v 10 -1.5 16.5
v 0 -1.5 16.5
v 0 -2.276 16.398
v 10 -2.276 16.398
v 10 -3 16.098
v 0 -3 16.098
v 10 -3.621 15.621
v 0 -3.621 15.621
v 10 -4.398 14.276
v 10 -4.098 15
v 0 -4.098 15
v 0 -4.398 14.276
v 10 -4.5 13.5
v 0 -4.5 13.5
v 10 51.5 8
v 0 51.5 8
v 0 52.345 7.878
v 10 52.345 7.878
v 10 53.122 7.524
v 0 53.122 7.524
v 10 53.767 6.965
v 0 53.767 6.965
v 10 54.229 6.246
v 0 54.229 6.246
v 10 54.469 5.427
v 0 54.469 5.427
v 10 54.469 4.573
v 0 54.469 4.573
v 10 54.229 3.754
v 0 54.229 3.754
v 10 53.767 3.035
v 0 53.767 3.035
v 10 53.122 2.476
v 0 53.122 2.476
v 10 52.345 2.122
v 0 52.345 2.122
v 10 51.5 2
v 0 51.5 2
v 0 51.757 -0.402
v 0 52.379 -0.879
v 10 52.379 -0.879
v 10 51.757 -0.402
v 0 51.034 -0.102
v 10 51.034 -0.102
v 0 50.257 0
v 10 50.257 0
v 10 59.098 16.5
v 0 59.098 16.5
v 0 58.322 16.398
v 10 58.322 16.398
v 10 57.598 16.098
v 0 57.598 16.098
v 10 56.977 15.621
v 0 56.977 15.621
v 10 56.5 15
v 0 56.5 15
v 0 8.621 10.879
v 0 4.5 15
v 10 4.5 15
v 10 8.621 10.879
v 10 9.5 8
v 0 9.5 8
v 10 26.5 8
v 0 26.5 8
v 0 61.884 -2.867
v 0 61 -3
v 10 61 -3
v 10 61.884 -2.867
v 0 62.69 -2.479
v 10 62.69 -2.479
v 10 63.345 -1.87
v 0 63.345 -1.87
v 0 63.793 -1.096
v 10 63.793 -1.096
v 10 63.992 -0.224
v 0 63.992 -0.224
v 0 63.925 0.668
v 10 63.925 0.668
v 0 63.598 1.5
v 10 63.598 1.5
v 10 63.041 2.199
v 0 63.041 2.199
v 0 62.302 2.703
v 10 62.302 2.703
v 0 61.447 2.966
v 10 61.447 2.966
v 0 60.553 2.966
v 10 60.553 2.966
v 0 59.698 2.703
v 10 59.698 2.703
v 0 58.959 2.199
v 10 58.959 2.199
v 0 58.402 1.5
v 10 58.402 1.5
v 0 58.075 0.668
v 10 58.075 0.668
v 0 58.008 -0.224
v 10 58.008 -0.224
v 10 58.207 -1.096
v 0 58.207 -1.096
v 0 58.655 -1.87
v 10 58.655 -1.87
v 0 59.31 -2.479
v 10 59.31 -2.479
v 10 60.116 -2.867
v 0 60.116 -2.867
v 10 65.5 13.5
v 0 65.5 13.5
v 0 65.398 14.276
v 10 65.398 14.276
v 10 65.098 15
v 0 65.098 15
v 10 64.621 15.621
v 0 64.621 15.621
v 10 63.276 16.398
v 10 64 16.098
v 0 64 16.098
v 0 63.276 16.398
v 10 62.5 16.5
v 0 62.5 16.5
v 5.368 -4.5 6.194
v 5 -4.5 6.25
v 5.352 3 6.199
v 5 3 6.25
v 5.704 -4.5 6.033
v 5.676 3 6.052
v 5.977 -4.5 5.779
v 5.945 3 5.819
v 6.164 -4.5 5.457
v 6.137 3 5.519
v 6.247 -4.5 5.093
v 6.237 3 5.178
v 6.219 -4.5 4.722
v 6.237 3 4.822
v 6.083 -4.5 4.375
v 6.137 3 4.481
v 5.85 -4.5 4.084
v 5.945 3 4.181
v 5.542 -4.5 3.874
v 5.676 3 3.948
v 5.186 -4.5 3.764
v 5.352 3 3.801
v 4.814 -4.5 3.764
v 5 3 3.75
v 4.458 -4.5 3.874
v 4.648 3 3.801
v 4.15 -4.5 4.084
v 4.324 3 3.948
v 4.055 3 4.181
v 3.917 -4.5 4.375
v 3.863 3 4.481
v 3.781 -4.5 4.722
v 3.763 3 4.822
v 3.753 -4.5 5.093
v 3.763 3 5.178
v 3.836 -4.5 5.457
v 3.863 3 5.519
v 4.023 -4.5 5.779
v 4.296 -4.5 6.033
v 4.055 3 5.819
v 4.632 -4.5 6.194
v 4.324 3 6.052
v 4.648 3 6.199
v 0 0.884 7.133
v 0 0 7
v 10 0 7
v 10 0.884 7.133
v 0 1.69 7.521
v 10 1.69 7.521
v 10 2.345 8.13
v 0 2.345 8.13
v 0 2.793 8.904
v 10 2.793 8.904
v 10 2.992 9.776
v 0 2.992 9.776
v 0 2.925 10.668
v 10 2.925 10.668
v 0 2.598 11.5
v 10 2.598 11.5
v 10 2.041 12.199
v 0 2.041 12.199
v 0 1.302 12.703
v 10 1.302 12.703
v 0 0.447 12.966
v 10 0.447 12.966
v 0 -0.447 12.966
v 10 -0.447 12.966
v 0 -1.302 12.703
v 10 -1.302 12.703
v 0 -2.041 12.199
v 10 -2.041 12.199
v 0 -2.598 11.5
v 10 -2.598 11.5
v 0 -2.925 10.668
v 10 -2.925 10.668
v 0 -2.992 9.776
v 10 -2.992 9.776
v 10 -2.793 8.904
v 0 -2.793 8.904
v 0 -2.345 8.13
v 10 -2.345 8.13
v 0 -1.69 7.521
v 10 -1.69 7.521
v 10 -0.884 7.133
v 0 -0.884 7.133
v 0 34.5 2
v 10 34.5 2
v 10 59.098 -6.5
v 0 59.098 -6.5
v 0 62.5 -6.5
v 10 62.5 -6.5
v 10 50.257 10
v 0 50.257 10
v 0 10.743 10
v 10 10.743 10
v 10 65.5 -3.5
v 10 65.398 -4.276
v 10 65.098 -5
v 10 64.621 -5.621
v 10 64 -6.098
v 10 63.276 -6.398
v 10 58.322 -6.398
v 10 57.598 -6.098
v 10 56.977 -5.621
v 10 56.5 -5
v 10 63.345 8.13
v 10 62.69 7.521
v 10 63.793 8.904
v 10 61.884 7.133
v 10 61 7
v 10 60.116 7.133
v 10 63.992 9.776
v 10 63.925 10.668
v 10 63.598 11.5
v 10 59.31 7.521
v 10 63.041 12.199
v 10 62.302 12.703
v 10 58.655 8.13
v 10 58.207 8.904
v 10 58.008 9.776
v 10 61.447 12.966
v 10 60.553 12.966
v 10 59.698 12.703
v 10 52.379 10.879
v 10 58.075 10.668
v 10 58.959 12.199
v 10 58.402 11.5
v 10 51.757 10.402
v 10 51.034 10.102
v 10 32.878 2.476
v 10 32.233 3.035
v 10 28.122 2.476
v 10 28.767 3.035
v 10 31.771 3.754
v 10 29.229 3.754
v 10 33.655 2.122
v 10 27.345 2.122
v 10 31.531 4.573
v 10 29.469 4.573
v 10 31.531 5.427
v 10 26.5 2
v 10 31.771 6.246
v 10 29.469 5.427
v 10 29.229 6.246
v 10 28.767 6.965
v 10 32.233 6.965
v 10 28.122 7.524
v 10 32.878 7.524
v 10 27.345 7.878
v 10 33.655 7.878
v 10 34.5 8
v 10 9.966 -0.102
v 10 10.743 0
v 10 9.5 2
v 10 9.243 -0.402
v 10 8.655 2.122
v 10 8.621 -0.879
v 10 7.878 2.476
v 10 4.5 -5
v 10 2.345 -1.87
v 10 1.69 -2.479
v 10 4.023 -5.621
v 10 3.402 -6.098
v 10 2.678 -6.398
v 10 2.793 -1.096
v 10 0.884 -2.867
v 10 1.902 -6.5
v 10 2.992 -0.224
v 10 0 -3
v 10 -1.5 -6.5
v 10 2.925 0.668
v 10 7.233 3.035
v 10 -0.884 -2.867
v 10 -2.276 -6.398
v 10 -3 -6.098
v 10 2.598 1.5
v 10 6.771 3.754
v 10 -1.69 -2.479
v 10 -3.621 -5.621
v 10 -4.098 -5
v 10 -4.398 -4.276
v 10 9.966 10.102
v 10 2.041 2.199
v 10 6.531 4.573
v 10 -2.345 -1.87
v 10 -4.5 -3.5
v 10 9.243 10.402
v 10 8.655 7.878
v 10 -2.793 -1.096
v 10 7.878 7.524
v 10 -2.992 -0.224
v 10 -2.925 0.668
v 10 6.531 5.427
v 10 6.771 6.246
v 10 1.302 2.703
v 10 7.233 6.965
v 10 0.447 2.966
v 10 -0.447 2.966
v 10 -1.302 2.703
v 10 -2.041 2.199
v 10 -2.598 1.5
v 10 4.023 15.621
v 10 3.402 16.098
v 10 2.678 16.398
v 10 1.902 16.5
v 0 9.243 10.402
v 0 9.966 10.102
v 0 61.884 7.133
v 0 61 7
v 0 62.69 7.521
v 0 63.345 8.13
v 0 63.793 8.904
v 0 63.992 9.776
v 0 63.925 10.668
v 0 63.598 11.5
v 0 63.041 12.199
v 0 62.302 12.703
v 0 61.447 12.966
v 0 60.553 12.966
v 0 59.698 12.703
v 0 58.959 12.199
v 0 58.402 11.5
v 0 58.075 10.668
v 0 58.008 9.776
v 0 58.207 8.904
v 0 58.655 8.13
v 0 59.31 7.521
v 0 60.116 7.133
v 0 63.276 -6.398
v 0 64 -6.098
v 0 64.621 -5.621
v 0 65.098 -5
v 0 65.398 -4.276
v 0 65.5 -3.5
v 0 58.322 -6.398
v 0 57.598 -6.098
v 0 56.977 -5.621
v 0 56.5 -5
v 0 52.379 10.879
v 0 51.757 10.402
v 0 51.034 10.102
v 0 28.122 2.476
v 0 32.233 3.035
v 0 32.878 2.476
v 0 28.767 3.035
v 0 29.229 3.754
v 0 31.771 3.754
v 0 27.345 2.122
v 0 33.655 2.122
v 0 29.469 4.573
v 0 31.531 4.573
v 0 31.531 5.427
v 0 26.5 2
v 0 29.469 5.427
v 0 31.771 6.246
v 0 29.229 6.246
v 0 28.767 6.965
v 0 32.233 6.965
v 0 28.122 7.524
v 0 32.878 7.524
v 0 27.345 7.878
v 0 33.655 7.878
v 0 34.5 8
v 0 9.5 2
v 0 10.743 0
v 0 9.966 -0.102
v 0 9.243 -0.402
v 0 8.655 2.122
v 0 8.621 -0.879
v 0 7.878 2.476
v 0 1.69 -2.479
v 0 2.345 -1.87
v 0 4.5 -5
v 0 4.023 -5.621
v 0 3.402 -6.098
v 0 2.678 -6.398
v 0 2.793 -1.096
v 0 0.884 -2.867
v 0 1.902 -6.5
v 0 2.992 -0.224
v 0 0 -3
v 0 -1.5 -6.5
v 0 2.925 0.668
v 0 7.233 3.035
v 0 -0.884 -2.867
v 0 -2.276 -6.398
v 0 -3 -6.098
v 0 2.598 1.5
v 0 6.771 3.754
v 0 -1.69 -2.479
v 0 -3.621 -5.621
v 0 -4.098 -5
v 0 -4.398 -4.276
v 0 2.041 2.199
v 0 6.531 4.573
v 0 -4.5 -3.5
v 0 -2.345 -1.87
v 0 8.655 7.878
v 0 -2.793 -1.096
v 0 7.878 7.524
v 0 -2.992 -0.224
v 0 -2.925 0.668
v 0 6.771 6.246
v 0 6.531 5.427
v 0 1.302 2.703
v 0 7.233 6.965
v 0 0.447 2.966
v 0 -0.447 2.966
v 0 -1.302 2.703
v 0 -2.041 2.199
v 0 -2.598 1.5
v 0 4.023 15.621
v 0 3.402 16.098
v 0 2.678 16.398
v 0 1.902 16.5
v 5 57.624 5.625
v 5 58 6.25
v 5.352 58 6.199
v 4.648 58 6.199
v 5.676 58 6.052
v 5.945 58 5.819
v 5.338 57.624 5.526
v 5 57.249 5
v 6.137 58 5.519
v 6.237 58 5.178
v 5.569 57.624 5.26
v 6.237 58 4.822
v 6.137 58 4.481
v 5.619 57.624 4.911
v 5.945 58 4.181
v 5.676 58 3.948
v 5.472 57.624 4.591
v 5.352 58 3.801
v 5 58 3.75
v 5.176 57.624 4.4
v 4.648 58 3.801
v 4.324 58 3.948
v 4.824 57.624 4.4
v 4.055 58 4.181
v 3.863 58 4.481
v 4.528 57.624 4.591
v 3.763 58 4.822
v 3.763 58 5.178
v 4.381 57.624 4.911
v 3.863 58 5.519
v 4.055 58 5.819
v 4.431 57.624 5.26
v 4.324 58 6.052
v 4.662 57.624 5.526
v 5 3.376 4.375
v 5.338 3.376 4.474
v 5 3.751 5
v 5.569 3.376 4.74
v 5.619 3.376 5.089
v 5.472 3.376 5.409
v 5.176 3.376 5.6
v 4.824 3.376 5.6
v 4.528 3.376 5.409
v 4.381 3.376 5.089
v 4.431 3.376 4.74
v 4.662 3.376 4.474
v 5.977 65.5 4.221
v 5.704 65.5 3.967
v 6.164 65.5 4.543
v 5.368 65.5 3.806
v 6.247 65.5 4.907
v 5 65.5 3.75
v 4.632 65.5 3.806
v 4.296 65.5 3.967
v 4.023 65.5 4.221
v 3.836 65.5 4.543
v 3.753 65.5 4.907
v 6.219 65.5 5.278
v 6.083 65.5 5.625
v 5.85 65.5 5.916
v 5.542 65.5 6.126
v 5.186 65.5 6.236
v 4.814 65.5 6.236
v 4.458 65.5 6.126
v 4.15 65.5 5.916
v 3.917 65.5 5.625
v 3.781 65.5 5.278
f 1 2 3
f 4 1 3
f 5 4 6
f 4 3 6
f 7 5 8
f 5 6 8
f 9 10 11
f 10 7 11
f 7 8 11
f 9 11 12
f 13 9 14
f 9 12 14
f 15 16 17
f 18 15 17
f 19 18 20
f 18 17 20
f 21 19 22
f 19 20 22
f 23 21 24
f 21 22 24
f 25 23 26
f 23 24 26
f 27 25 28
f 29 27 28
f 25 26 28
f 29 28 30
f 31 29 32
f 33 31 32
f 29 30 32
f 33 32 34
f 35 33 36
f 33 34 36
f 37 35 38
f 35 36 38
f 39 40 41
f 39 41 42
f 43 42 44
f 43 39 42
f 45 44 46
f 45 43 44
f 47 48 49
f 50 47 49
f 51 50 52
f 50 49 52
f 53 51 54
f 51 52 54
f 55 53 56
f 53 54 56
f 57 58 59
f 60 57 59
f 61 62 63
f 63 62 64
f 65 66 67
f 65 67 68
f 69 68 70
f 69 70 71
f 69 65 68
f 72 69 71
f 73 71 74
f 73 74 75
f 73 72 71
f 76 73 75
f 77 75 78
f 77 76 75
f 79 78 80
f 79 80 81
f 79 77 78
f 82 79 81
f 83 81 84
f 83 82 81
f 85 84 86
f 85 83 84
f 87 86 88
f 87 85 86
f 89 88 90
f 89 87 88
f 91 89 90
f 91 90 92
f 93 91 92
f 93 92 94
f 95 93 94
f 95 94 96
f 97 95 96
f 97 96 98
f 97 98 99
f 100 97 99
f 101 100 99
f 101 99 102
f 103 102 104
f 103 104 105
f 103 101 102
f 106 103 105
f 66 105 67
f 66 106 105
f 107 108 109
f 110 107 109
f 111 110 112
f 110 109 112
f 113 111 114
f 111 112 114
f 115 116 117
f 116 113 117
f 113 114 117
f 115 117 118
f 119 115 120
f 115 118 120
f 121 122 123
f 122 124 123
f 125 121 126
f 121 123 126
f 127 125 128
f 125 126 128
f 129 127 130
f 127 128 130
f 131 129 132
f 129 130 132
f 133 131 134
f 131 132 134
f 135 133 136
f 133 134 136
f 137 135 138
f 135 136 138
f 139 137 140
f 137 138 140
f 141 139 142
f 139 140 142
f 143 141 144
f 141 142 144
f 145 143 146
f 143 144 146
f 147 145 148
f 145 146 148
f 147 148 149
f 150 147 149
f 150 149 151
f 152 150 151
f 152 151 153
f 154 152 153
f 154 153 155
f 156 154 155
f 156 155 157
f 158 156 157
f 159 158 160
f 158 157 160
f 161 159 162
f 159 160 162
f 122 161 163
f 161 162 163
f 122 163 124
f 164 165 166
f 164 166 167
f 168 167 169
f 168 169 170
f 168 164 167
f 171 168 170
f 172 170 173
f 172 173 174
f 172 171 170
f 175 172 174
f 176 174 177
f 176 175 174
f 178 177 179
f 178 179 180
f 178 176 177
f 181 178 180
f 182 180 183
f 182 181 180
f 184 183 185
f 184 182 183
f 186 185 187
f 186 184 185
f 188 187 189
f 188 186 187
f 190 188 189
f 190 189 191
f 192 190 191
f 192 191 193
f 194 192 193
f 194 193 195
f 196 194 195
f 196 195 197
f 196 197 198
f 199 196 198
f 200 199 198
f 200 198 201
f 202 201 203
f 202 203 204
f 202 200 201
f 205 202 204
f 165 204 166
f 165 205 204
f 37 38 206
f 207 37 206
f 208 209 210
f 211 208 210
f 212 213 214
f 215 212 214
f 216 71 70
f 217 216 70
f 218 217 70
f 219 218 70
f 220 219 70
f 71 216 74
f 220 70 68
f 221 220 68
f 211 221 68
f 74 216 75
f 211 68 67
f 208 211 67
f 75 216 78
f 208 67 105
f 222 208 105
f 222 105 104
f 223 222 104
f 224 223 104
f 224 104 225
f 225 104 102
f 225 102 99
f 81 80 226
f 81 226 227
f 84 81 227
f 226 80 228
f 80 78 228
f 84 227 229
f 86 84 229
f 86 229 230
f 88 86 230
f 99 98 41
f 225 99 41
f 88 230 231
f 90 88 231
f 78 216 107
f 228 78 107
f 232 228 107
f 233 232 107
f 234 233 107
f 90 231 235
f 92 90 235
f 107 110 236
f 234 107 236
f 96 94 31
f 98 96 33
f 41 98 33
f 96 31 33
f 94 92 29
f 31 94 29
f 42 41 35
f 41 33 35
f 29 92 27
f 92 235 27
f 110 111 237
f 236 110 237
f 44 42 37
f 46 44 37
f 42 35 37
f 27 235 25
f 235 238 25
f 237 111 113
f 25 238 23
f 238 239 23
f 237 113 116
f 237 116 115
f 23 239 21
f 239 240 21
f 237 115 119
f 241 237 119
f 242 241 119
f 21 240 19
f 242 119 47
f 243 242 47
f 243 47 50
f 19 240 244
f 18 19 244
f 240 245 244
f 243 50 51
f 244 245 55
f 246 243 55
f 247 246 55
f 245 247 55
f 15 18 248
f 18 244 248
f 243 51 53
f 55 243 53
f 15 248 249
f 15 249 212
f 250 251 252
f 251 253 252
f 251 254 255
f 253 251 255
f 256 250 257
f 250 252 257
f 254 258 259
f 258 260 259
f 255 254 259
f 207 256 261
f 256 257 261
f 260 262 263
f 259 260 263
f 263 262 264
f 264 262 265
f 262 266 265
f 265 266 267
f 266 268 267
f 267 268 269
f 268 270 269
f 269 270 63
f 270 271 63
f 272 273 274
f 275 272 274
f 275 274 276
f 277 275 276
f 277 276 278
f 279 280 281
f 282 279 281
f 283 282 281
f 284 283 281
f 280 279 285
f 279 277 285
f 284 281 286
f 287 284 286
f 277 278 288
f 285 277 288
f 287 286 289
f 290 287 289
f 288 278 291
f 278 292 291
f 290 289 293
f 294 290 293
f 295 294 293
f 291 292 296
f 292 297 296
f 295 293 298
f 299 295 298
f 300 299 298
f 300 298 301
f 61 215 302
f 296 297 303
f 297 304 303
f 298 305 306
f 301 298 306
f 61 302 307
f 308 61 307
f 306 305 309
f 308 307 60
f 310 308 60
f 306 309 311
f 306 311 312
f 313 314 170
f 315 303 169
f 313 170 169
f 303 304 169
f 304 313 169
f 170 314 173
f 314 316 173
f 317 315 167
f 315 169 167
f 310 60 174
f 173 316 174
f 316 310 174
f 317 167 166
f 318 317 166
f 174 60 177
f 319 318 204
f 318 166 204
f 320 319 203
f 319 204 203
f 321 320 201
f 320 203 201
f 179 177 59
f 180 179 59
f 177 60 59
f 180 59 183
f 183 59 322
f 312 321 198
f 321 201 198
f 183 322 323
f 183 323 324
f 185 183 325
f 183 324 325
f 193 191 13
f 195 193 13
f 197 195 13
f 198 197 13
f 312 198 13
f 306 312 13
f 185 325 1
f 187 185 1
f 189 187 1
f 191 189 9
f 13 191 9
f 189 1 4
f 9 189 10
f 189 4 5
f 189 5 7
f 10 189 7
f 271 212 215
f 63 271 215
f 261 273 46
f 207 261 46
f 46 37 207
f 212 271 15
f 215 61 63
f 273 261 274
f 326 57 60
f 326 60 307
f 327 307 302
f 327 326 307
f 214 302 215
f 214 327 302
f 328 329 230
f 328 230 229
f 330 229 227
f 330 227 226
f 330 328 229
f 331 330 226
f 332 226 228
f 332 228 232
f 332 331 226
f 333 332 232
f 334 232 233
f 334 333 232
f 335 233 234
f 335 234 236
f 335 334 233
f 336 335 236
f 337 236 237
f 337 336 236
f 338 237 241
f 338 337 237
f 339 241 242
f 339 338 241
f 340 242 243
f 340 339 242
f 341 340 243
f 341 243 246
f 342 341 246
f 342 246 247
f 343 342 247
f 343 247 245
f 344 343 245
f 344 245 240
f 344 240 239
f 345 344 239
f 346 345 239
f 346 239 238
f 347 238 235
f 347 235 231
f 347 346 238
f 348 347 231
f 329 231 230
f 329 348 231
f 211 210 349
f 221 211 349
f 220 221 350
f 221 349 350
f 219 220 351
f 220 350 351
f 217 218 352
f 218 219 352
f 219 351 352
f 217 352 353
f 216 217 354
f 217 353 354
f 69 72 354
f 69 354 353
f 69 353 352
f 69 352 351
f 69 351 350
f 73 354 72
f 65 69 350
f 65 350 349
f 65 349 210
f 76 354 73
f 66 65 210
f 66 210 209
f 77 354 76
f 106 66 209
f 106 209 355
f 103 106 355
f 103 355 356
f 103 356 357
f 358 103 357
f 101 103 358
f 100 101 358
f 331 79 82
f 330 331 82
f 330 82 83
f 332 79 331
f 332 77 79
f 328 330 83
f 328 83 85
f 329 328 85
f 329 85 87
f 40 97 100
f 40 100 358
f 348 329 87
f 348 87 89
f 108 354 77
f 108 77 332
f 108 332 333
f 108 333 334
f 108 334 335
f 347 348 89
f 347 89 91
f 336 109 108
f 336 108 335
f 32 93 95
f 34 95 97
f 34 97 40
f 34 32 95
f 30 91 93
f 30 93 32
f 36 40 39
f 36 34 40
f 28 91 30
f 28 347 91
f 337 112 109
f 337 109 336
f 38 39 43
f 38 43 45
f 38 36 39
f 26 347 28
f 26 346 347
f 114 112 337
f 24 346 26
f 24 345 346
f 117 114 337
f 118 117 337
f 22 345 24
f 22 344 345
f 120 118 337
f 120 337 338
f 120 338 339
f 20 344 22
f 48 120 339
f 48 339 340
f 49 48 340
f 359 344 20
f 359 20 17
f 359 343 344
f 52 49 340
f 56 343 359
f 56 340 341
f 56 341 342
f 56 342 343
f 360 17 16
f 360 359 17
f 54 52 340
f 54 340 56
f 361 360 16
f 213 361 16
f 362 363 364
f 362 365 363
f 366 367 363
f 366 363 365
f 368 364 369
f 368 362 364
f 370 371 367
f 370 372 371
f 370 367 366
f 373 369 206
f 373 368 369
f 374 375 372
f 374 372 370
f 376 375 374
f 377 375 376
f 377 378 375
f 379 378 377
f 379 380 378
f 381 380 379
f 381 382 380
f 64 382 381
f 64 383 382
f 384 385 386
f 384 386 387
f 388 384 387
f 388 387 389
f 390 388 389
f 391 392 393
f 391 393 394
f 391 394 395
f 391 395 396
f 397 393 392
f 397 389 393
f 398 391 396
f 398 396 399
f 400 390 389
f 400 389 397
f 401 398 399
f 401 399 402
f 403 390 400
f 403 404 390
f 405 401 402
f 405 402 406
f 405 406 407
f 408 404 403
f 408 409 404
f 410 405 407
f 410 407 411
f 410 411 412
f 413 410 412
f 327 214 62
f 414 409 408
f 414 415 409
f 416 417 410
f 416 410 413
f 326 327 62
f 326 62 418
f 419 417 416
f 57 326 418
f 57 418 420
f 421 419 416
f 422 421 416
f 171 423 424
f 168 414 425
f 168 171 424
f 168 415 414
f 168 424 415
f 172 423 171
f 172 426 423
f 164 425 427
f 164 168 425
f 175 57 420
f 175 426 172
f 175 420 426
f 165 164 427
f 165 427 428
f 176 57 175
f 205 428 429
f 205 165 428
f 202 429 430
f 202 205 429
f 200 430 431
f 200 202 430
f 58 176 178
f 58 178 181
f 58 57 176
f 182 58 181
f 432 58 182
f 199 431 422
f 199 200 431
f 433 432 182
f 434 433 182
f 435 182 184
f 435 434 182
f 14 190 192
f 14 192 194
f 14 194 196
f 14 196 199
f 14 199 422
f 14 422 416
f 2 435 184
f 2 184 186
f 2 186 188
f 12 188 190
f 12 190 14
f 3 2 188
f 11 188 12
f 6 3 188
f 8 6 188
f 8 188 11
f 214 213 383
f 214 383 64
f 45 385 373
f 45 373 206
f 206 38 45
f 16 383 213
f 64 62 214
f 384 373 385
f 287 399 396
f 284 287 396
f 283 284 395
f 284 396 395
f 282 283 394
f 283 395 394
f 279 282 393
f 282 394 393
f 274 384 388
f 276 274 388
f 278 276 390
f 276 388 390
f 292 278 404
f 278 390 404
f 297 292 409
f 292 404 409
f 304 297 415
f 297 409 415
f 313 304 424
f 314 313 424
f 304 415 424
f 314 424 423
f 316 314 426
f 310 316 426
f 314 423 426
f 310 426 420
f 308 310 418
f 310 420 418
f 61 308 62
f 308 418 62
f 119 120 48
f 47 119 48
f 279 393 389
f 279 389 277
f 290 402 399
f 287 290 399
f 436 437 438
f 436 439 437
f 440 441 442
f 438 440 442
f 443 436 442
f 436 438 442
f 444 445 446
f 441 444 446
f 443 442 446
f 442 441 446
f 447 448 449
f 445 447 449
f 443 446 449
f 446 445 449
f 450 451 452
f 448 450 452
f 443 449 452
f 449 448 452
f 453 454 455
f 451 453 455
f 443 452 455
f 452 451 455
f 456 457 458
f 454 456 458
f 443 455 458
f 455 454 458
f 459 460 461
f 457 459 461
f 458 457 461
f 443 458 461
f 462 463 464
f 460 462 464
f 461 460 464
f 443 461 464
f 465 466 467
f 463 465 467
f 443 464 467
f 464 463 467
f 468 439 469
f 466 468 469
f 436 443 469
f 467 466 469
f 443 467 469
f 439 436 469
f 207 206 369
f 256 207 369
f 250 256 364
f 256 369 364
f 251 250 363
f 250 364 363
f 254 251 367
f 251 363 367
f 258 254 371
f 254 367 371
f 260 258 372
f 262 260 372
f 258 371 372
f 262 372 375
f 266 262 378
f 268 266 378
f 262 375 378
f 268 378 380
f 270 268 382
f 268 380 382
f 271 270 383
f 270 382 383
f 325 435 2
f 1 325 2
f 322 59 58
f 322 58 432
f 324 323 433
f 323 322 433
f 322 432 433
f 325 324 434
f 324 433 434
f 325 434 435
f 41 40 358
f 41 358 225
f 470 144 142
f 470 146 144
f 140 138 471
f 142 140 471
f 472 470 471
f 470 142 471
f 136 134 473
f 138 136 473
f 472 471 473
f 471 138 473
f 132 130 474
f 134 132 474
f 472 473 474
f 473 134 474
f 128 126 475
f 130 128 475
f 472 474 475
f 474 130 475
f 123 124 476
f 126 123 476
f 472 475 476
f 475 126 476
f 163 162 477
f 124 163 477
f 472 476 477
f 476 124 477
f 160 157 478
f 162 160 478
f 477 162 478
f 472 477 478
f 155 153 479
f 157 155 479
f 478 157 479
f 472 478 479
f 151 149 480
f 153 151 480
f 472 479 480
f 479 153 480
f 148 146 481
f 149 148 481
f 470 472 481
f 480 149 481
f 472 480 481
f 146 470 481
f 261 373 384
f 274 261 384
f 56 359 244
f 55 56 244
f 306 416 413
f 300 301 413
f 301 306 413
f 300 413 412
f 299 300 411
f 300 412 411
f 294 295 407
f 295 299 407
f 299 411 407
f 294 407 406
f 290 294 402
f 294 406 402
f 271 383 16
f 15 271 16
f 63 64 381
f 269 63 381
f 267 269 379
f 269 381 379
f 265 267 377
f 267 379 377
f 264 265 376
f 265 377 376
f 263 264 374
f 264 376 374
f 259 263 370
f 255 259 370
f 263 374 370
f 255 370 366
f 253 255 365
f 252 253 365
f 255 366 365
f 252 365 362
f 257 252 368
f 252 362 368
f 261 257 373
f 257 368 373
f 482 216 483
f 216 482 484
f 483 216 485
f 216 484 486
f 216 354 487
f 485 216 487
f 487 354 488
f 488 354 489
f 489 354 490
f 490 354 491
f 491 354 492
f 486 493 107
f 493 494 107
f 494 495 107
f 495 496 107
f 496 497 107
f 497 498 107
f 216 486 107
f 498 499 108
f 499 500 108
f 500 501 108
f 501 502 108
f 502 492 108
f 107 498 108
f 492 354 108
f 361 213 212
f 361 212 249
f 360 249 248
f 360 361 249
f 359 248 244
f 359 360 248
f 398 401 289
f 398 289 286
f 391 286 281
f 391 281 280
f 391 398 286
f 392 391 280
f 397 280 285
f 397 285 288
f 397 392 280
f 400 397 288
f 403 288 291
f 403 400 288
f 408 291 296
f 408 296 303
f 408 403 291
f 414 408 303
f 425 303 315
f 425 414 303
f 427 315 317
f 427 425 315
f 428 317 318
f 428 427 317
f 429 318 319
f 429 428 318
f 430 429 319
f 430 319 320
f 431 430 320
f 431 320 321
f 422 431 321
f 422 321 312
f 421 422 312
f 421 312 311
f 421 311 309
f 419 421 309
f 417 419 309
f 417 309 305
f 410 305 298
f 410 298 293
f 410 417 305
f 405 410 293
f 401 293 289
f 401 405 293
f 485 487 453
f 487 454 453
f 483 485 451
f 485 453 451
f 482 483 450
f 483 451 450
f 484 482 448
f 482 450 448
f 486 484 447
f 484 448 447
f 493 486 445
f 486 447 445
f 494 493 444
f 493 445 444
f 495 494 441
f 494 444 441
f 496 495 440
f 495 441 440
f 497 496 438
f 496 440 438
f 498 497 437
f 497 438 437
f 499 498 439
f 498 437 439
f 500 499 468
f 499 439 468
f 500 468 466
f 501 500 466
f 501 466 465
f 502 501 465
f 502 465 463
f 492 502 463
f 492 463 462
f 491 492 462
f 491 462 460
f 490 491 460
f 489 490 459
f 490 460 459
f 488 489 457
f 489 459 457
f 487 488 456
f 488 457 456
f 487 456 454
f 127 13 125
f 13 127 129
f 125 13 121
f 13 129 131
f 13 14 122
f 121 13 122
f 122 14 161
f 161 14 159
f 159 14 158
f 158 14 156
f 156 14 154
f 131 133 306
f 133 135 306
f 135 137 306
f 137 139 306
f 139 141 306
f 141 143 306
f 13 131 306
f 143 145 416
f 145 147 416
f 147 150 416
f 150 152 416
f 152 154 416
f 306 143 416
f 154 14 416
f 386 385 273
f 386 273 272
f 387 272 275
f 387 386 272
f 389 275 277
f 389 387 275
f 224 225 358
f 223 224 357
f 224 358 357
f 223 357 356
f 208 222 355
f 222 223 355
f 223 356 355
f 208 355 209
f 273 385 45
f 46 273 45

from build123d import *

# Parameters (mm, degrees)
SKETCH1_R                       = 3
BOSS_EXTRUDE1_DEPTH             = 10
CHAMFER1_SIZE                   = 5
FILLET1_R                       = 3
M3_TAPPED_HOLE3_D               = 2.5
M3_TAPPED_HOLE3_DEPTH           = 7.5
M3_TAPPED_HOLE3_TIP             = 0.751075774
M3_TAPPED_HOLE3_ON_FACE_2_D     = 2.5
M3_TAPPED_HOLE3_ON_FACE_2_DEPTH = 7.5
M3_TAPPED_HOLE3_ON_FACE_2_TIP   = 0.751075774


with BuildPart() as part:
    # Sketch1 → Boss-Extrude1 (new body)
    with BuildSketch(Plane(origin=(0, 0, 0), x_dir=(0, 0, -1), z_dir=(1, 0, 0))):
        Polygon((-16.5, 65.5), (-16.5, 56.5), (-10, 56.5), (-10, 4.5), (-16.5, 4.5), (-16.5, -4.5), (6.5, -4.5), (6.5, 4.5), (0, 4.5), (0, 56.5), (6.5, 56.5), (6.5, 65.5), align=None)
        with Locations((-10, 0)):
            Circle(SKETCH1_R, mode=Mode.SUBTRACT)
        with BuildLine():
            ThreePointArc((-8, 26.5), (-5, 29.5), (-2, 26.5))
            Line((-2, 26.5), (-2, 9.5))
            ThreePointArc((-2, 9.5), (-5, 6.5), (-8, 9.5))
            Line((-8, 9.5), (-8, 26.5))
        make_face(mode=Mode.SUBTRACT)
        Circle(SKETCH1_R, mode=Mode.SUBTRACT)
        with BuildLine():
            Line((-2, 51.5), (-2, 34.5))
            ThreePointArc((-2, 34.5), (-5, 31.5), (-8, 34.5))
            Line((-8, 34.5), (-8, 51.5))
            ThreePointArc((-8, 51.5), (-5, 54.5), (-2, 51.5))
        make_face(mode=Mode.SUBTRACT)
        with Locations((-10, 61)):
            Circle(SKETCH1_R, mode=Mode.SUBTRACT)
        with Locations((0, 61)):
            Circle(SKETCH1_R, mode=Mode.SUBTRACT)
    extrude(amount=BOSS_EXTRUDE1_DEPTH)

    # Chamfer1
    chamfer1_edges = [part.edges().sort_by_distance(p)[0] for p in [
        (5, 4.5, 10),
        (5, 56.5, 10),
        (5, 56.5, 0),
        (5, 4.5, 0),
    ]]
    chamfer(chamfer1_edges, length=CHAMFER1_SIZE)

    # Fillet1
    # the kernel refuses this fillet: 3 mm, written as the material it adds along each edge
    with BuildSketch(Plane(origin=(0, 51.5, 0), x_dir=(0, 0.7071067811865468, -0.7071067811865482), z_dir=(1, 0, 0)), Plane(origin=(0, 9.5, 0), x_dir=(0, 1, 0), z_dir=(1, 0, 0))) as fillet1_piece_1:
        with BuildLine():
            CenterArc((FILLET1_R * 0.414213562373, -FILLET1_R), FILLET1_R, 90, 45)
            Line((-FILLET1_R * 0.292893218813, -FILLET1_R * 0.292893218813), (0, 0))
            Line((0, 0), (FILLET1_R * 0.414213562373, 0))
        make_face()
    extrude(amount=10)
    with BuildSketch(Plane(origin=(0, 9.5, 10), x_dir=(0, 1, 0), z_dir=(1, 0, 0)), Plane(origin=(0, 51.5, 10), x_dir=(0, 0.7071067811865468, 0.7071067811865482), z_dir=(1, 0, 0))) as fillet1_piece_2:
        with BuildLine():
            CenterArc((FILLET1_R * 0.414213562373, FILLET1_R), FILLET1_R, 225, 45)
            Line((-FILLET1_R * 0.292893218813, FILLET1_R * 0.292893218813), (0, 0))
            Line((0, 0), (FILLET1_R * 0.414213562373, 0))
        make_face()
    extrude(amount=10)
    # the kernel refuses this fillet: 3 mm, written as the material it takes off along each edge
    with BuildSketch(Plane(origin=(-6.495190528, 56.5, 16.5), x_dir=(0, 1, 0), z_dir=(1, 0, 0))) as fillet1_2_piece_1:
        with BuildLine():
            CenterArc((2.598076211, -3), FILLET1_R, 90, 60)
            Line((0, -1.5), (0, 0))
            Line((0, 0), (2.598076211, 0))
        make_face()
    extrude(amount=22.990381057, mode=Mode.SUBTRACT)
    with BuildSketch(Plane(origin=(-7.5, 65.5, 16.5), x_dir=(0, 0, -1), z_dir=(1, 0, 0)), Plane(origin=(-7.5, 65.5, -6.5), x_dir=(0, -1, 0), z_dir=(1, 0, 0))) as fillet1_2_piece_2:
        with BuildLine():
            CenterArc((FILLET1_R, -FILLET1_R), FILLET1_R, 90, 90)
            Line((0, -FILLET1_R), (0, 0))
            Line((0, 0), (FILLET1_R, 0))
        make_face()
    extrude(amount=25, mode=Mode.SUBTRACT)
    with BuildSketch(Plane(origin=(-6.495190528, 56.5, -6.5), x_dir=(0, 0, 1), z_dir=(1, 0, 0))) as fillet1_2_piece_3:
        with BuildLine():
            CenterArc((3, -2.598076211), FILLET1_R, 120, 60)
            Line((0, -2.598076211), (0, 0))
            Line((0, 0), (1.5, 0))
        make_face()
    extrude(amount=22.990381057, mode=Mode.SUBTRACT)
    with BuildSketch(Plane(origin=(-6.495190528, 4.5, -6.5), x_dir=(0, 0, 1), z_dir=(1, 0, 0))) as fillet1_2_piece_4:
        with BuildLine():
            CenterArc((3, 2.598076211), FILLET1_R, 180, 60)
            Line((0, 2.598076211), (0, 0))
            Line((0, 0), (1.5, 0))
        make_face()
    extrude(amount=22.990381057, mode=Mode.SUBTRACT)
    with BuildSketch(Plane(origin=(-7.5, -4.5, -6.5), x_dir=(0, 1, 0), z_dir=(1, 0, 0)), Plane(origin=(-7.5, -4.5, 16.5), x_dir=(0, 0, -1), z_dir=(1, 0, 0))) as fillet1_2_piece_5:
        with BuildLine():
            CenterArc((FILLET1_R, FILLET1_R), FILLET1_R, 180, 90)
            Line((0, FILLET1_R), (0, 0))
            Line((0, 0), (FILLET1_R, 0))
        make_face()
    extrude(amount=25, mode=Mode.SUBTRACT)
    with BuildSketch(Plane(origin=(-6.495190528, 4.5, 16.5), x_dir=(0, -1, 0), z_dir=(1, 0, 0))) as fillet1_2_piece_6:
        with BuildLine():
            CenterArc((2.598076211, 3), FILLET1_R, 210, 60)
            Line((0, 1.5), (0, 0))
            Line((0, 0), (2.598076211, 0))
        make_face()
    extrude(amount=22.990381057, mode=Mode.SUBTRACT)

    # M3 Tapped Hole3
    with Locations(Plane(origin=(5, 65.5, 5), x_dir=(0, 0, 1), z_dir=(0, 1, 0))):
        with Locations((0, 0)):
            Hole(M3_TAPPED_HOLE3_D / 2, depth=M3_TAPPED_HOLE3_DEPTH)
            with Locations((0, 0, -(M3_TAPPED_HOLE3_DEPTH + M3_TAPPED_HOLE3_TIP / 2))):  # 118° drill point
                Cone(0, M3_TAPPED_HOLE3_D / 2, M3_TAPPED_HOLE3_TIP, mode=Mode.SUBTRACT)

    # M3 Tapped Hole3 on face 2
    with Locations(Plane(origin=(5, -4.5, 5), x_dir=(0, 0, -1), z_dir=(0, -1, 0))):
        with Locations((0, 0)):
            Hole(M3_TAPPED_HOLE3_ON_FACE_2_D / 2, depth=M3_TAPPED_HOLE3_ON_FACE_2_DEPTH)
            with Locations((0, 0, -(M3_TAPPED_HOLE3_ON_FACE_2_DEPTH + M3_TAPPED_HOLE3_ON_FACE_2_TIP / 2))):  # 118° drill point
                Cone(0, M3_TAPPED_HOLE3_ON_FACE_2_D / 2, M3_TAPPED_HOLE3_ON_FACE_2_TIP, mode=Mode.SUBTRACT)


solid = part.part
